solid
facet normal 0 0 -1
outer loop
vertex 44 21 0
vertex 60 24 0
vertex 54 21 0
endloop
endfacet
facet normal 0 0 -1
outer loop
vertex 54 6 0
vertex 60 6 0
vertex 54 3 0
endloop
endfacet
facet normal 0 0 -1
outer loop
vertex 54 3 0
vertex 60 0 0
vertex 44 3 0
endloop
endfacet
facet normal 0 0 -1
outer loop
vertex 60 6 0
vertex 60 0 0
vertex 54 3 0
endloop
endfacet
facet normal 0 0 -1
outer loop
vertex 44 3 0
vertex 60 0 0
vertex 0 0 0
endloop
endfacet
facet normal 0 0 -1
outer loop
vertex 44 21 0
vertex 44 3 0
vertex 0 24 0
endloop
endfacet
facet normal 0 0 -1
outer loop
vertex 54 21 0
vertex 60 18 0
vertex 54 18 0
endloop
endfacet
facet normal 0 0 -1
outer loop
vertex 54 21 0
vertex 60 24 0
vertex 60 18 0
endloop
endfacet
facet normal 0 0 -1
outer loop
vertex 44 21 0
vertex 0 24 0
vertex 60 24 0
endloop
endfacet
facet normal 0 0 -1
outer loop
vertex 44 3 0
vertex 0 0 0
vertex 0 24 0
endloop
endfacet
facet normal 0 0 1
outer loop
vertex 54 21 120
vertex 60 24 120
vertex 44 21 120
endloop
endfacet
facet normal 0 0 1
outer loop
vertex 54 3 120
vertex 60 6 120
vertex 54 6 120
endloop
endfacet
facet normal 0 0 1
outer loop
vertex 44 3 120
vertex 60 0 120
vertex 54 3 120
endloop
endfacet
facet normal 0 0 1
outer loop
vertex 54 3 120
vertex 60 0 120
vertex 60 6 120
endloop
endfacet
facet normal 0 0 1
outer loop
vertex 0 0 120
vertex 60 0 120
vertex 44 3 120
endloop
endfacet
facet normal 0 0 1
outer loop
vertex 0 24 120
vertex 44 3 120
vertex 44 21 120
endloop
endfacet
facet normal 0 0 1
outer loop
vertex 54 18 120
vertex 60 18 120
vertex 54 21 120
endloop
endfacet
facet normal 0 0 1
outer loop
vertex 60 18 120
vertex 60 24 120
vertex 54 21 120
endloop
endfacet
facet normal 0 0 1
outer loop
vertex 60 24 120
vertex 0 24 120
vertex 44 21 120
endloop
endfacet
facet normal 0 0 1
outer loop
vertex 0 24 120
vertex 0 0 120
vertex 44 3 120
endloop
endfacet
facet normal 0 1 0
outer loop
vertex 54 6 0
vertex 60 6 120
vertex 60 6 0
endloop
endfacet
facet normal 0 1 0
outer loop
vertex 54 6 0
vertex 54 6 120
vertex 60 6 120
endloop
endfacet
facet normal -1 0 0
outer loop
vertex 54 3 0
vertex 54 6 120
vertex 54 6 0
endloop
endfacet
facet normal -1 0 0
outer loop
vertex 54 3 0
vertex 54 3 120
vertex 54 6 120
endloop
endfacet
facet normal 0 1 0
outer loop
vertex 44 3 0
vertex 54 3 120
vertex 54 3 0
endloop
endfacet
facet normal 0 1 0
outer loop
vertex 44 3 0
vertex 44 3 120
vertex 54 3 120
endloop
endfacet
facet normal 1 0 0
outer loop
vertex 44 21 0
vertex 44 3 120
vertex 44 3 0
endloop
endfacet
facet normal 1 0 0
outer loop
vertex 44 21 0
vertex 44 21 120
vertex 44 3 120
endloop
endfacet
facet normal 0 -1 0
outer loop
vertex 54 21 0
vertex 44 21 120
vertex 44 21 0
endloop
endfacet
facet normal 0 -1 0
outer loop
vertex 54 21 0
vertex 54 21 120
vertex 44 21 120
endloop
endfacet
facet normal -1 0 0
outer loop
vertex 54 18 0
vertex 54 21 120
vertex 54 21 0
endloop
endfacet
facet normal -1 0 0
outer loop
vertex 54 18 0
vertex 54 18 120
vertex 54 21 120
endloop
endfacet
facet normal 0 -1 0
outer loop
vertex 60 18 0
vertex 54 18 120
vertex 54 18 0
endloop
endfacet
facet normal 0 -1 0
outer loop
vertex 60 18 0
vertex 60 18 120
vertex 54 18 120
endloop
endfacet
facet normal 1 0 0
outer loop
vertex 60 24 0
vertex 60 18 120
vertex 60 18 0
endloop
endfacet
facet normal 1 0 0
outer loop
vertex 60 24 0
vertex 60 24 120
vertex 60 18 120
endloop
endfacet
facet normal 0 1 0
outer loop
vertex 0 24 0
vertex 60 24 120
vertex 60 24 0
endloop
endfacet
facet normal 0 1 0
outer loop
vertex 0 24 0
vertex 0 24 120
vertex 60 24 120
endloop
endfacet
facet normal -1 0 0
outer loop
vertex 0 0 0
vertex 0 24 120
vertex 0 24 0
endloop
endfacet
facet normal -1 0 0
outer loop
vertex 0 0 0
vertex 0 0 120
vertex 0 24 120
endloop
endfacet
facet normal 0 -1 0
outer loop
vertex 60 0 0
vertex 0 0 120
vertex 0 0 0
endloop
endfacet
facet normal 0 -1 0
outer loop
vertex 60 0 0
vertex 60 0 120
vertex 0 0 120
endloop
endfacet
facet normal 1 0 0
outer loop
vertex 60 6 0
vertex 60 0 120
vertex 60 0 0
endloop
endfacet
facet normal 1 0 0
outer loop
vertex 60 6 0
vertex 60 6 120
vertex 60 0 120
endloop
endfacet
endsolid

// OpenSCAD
$fn = 32;

// ----------------------------------------------------------------------
// T-slot rail: 60 x 24 mm section, 120 mm long
// ----------------------------------------------------------------------

// --- parameters (mm) ---
profile_height = 120;     // extrusion height
profile_points = 12;      // points of the closed outline

profile = [[0, 0], [60, 0], [60, 6], [54, 6], [54, 3], [44, 3], [44, 21], [54, 21], [54, 18], [60, 18], [60, 24], [0, 24]];  // single closed polygon, 12 points, counter clockwise

// --- the one profile operation ---
linear_extrude(height = profile_height) polygon(points = profile);
